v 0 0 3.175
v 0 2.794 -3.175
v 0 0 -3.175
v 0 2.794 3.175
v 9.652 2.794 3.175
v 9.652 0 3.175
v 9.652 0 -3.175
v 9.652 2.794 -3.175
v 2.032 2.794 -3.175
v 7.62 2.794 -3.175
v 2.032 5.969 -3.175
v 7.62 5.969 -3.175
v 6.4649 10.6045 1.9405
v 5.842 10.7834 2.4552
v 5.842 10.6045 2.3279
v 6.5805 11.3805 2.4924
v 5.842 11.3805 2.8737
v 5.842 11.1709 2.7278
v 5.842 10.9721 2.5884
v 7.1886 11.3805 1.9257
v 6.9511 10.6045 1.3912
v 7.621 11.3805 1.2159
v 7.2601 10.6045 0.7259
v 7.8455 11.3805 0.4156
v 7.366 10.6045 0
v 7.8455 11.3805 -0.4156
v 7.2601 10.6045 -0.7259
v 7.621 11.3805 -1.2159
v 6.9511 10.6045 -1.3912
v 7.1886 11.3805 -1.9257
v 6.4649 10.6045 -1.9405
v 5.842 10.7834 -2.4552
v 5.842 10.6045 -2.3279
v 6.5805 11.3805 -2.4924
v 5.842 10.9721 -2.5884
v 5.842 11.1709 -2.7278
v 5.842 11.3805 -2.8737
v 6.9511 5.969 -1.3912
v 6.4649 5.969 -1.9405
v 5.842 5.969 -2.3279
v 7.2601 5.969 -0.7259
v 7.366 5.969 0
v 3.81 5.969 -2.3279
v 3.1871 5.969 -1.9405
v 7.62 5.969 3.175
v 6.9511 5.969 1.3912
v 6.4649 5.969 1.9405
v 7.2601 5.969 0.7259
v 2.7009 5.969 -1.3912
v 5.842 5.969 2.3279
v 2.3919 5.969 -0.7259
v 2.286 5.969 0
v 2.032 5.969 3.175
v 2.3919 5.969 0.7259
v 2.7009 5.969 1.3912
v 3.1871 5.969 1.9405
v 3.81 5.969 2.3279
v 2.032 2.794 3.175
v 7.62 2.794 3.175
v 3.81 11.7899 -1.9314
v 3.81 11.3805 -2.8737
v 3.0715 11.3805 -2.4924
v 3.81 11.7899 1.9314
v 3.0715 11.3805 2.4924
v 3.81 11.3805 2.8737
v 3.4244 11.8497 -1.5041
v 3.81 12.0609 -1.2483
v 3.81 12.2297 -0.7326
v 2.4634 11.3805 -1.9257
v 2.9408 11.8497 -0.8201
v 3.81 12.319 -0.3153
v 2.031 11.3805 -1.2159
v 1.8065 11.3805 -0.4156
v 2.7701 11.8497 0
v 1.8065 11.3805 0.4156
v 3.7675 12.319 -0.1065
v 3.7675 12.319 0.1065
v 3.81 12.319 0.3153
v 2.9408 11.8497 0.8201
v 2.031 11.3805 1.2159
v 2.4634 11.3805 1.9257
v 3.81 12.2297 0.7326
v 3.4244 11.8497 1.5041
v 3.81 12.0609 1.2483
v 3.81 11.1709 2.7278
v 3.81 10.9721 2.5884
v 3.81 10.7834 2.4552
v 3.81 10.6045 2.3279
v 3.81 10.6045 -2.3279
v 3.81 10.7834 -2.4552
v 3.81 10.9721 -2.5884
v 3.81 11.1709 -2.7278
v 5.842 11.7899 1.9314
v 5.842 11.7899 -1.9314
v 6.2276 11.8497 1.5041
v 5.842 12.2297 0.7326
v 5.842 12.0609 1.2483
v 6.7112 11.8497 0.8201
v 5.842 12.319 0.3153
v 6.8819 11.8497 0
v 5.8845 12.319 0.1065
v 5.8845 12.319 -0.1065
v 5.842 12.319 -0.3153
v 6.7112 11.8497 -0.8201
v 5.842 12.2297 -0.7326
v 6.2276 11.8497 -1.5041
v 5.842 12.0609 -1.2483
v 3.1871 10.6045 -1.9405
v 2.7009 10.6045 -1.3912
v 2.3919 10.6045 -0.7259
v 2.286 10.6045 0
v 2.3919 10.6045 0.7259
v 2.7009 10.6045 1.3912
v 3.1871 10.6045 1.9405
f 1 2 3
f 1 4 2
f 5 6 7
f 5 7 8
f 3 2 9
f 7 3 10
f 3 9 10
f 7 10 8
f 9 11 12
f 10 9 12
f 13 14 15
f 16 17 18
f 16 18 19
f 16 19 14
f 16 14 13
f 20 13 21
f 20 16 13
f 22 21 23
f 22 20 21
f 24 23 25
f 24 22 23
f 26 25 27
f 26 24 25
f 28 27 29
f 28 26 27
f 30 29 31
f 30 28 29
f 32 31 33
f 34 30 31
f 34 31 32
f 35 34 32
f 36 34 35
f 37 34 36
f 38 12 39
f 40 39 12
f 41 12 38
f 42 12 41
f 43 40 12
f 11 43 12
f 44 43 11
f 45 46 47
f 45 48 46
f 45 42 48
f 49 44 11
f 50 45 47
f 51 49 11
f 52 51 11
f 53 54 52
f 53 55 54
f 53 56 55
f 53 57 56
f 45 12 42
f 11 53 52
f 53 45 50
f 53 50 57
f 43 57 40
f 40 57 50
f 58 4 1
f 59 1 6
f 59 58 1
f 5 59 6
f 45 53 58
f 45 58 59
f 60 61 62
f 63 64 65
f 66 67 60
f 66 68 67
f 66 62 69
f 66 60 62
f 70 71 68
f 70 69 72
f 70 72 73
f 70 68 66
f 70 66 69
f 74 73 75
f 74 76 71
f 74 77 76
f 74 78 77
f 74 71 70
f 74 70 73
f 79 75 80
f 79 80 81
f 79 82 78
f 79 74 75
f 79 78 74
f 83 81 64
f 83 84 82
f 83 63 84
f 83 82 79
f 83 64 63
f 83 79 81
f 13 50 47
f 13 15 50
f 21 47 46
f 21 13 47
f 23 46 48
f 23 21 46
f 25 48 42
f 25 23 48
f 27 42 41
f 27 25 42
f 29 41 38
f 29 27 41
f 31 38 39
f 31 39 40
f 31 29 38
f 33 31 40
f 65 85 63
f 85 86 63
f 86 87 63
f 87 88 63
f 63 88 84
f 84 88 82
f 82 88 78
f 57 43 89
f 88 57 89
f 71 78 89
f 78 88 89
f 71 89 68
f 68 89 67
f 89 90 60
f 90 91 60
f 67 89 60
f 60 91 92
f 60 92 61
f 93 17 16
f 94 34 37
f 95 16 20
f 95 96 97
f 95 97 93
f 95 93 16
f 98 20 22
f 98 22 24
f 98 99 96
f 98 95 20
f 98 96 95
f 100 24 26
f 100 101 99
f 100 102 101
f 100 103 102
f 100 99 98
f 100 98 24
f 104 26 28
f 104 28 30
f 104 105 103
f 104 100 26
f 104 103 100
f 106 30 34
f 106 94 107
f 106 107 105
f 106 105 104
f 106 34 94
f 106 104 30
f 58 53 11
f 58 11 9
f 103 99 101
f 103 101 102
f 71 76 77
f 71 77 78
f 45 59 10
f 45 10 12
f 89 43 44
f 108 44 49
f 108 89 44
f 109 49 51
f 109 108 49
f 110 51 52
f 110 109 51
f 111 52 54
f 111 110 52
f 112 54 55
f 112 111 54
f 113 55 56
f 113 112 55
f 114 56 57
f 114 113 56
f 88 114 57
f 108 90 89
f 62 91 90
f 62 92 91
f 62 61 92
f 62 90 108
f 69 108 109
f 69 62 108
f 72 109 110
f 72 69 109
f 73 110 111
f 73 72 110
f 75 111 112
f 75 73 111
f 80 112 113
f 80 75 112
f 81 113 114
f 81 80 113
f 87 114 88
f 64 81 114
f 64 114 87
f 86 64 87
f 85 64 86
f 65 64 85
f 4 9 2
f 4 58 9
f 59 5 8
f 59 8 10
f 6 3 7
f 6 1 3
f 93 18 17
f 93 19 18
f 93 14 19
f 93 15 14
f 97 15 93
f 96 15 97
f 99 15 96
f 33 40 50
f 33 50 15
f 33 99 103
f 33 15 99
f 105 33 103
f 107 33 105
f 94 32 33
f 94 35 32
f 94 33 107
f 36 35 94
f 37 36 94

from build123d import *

# Parameters (mm, degrees)
BOSS_EXTRUDE1_DEPTH     = 3.175
CUT_EXTRUDE1_DEPTH      = 16.968703454
CUT_EXTRUDE1_DEPTH_BACK = 16.968703454
SKETCH4_W               = 2.032
SKETCH4_H               = 12.7


with BuildPart() as part:
    # Sketch1 → Boss-Extrude1 (new, symmetric)
    with BuildSketch(Plane.XY):
        Polygon((0, 0), (9.652, 0), (9.652, 2.794), (7.62, 2.794), (7.62, 5.969), (2.032, 5.969), (2.032, 2.794), (0, 2.794), align=None)
    extrude(amount=BOSS_EXTRUDE1_DEPTH, both=True)

    # Sketch3 → Revolve1 (revolve)
    with BuildSketch(Plane.XY, mode=Mode.PRIVATE) as revolve1_sk:
        Polygon((3.76219647, 12.319), (4.326476153, 12.319), (4.326476153, 5.969), (2.286, 5.969), (2.286, 10.6045), (1.778, 11.38048125), align=None)
    revolve(revolve1_sk.sketch.rotate(Axis((4.826, 5.969, 0), (0, 1, 0)), 270), axis=Axis((4.826, 5.969, 0), (0, 1, 0)))

    # Sketch4 → Cut-Extrude1 (cut, two sides: drawn at the far end of the back side and taken through both)
    with BuildSketch(Plane.XY.offset(-CUT_EXTRUDE1_DEPTH_BACK)):
        with Locations((4.826, 12.319)):
            Rectangle(SKETCH4_W, SKETCH4_H)
    extrude(amount=CUT_EXTRUDE1_DEPTH + CUT_EXTRUDE1_DEPTH_BACK, mode=Mode.SUBTRACT)


solid = part.part
